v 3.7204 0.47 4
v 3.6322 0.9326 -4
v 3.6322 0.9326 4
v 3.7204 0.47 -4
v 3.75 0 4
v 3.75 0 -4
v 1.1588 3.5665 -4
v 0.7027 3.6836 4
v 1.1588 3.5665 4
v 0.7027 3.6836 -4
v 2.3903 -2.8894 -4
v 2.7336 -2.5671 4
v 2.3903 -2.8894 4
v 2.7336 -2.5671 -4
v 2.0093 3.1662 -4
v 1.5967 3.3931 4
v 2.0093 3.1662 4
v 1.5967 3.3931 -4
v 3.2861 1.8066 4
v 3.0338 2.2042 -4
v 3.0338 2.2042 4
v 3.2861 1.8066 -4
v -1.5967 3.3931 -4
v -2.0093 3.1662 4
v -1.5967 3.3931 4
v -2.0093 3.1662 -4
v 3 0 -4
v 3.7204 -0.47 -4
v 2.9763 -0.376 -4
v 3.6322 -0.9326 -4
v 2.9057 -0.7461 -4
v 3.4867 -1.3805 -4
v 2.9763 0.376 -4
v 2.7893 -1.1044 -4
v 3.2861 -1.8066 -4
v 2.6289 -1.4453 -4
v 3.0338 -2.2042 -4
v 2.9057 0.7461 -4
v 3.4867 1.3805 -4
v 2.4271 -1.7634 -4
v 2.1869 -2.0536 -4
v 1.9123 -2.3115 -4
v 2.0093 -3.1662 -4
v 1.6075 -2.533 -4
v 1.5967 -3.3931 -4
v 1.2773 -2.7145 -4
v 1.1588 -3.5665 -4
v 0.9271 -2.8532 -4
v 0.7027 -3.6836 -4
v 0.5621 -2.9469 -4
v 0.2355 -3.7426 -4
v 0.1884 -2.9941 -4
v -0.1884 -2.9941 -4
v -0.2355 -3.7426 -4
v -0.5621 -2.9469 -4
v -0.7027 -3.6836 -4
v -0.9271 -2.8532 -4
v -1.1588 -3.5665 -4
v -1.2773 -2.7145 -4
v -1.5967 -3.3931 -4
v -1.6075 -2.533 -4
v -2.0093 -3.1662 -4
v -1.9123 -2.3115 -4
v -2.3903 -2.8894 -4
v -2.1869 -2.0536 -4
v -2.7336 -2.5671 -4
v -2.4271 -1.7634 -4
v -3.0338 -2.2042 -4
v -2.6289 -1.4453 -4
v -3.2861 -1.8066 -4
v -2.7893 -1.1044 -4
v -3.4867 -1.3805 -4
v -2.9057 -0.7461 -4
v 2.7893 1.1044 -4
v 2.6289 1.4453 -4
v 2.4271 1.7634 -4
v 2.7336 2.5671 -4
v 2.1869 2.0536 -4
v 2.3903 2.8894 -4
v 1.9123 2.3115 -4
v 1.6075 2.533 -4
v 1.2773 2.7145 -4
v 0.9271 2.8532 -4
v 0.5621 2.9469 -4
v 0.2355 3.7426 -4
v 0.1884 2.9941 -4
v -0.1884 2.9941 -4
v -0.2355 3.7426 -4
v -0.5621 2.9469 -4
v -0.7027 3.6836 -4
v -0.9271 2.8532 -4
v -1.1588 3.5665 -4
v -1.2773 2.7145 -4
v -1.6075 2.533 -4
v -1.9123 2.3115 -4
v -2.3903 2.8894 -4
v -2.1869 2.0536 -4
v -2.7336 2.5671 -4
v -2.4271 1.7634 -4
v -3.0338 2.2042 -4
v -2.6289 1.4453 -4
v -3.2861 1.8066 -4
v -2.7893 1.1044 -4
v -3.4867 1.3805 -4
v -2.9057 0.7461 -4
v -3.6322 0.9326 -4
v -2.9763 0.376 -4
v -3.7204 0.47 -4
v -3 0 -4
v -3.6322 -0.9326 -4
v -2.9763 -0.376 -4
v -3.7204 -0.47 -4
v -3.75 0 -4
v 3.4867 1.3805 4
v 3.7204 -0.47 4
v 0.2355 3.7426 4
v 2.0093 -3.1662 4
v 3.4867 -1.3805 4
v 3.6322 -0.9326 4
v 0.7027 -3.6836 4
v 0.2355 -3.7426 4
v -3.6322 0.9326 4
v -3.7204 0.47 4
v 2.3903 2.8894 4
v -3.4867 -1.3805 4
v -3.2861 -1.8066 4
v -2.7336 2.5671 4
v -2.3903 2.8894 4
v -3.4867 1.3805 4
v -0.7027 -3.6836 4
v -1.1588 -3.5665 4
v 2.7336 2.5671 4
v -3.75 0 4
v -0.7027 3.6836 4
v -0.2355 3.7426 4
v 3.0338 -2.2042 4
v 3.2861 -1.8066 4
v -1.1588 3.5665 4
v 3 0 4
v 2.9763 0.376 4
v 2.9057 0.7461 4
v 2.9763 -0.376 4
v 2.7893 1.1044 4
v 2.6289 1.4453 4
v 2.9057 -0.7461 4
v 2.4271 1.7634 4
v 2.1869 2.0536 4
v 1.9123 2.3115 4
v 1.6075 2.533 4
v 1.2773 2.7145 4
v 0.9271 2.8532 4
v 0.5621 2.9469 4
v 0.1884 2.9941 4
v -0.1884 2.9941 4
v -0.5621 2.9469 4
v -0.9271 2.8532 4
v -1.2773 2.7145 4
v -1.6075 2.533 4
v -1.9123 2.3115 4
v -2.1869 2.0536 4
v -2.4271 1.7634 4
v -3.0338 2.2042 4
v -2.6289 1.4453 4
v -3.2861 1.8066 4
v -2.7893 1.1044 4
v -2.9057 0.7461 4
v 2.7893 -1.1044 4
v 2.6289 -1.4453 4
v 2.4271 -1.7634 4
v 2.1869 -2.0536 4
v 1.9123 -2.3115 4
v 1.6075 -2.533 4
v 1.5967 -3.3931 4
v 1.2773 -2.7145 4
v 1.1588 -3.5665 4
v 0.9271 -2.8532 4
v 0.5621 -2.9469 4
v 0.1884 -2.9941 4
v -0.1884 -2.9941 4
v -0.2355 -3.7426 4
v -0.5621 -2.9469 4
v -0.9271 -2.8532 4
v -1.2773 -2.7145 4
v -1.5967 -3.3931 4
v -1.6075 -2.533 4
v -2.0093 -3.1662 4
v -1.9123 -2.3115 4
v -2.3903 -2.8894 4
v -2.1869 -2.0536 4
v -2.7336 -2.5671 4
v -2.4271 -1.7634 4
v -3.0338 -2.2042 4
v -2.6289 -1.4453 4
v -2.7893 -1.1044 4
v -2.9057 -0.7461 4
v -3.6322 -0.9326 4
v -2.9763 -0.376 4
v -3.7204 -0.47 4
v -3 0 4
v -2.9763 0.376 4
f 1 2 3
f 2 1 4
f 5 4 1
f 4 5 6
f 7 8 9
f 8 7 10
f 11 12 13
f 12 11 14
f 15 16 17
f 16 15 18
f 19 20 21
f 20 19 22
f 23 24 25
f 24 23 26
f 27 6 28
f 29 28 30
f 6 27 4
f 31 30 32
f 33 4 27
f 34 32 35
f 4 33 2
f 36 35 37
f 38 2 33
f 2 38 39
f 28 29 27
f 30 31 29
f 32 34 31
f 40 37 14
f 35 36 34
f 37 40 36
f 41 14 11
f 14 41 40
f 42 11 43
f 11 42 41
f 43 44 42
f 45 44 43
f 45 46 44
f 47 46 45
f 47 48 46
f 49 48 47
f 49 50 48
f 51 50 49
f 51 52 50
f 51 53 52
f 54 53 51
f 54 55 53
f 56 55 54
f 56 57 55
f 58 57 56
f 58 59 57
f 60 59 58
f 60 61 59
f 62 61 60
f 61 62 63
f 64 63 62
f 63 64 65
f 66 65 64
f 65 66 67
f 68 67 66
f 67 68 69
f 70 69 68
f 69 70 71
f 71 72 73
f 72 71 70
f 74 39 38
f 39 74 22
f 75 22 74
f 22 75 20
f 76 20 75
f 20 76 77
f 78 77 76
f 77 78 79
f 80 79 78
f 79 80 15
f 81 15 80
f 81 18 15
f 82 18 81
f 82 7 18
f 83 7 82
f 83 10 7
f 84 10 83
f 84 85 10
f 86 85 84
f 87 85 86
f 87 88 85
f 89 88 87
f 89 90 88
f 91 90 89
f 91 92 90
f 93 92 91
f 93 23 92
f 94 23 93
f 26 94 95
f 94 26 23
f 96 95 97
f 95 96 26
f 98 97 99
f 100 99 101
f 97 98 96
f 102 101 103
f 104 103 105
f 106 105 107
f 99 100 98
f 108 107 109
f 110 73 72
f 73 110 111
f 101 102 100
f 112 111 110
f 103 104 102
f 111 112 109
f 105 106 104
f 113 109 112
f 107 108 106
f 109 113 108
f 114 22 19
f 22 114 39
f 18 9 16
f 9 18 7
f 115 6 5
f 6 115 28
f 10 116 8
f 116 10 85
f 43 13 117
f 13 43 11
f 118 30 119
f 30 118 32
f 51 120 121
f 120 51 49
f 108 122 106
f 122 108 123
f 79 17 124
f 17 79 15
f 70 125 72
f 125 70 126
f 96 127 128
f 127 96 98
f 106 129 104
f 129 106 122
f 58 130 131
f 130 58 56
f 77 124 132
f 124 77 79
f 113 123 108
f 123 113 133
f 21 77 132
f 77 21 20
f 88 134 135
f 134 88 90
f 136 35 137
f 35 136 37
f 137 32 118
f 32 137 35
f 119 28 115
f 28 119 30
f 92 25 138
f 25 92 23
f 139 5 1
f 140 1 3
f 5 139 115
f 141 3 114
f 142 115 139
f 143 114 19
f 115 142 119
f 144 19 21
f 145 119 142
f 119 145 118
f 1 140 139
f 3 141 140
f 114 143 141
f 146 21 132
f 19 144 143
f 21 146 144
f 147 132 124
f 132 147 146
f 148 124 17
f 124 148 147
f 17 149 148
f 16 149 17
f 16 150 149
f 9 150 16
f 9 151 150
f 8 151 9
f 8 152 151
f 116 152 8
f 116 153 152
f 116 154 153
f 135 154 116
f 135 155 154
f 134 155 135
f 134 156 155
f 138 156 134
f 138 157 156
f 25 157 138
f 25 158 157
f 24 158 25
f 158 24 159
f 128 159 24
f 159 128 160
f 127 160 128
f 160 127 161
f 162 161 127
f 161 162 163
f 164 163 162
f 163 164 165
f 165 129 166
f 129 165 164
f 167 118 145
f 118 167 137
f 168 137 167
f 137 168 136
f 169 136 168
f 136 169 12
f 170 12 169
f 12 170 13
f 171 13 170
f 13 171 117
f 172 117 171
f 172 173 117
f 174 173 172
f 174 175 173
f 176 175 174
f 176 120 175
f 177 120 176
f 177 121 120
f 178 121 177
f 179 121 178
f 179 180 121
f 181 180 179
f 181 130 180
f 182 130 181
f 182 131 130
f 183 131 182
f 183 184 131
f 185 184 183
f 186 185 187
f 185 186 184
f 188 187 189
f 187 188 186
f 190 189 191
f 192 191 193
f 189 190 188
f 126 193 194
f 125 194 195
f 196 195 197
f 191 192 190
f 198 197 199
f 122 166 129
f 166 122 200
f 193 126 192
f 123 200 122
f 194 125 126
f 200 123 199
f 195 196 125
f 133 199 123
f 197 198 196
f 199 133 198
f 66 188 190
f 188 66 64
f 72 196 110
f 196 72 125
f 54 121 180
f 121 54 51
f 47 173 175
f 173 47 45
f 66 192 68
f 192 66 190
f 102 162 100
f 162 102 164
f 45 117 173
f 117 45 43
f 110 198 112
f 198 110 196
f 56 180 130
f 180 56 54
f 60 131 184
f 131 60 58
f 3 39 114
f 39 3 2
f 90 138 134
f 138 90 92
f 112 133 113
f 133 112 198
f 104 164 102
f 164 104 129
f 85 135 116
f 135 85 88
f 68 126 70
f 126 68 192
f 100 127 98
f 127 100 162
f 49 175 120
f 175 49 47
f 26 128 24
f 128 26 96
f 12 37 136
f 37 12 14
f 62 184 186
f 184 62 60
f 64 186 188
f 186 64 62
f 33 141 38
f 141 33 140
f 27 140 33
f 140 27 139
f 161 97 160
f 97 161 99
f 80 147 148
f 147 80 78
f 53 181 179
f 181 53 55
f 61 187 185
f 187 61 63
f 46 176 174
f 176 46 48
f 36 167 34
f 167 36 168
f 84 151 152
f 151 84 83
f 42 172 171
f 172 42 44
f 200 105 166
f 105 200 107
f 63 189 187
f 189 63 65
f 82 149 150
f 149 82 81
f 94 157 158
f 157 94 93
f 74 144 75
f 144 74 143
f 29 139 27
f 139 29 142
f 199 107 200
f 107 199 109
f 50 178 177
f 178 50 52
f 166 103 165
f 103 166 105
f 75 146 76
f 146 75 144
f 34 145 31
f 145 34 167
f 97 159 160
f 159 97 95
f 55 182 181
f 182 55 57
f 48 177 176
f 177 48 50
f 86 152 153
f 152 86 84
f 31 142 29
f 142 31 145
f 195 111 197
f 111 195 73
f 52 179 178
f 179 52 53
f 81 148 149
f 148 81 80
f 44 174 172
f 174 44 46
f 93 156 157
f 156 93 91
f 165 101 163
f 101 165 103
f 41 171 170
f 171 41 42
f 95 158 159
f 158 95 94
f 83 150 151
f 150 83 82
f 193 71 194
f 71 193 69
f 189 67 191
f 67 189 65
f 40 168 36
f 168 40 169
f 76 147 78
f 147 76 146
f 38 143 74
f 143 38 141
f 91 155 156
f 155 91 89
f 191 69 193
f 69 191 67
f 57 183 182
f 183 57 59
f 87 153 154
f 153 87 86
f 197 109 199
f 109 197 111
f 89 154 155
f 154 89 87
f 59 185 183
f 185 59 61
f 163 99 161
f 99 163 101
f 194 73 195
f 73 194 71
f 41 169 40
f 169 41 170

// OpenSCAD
$fn = 50;


difference() {
	union() {
		translate(v = [0, 0, -4.0000000000]) {
			cylinder(h = 8, r = 3.7500000000);
		}
	}
	union() {
		translate(v = [0, 0, -100.0000000000]) {
			cylinder(h = 200, r = 3.0000000000);
		}
	}
}
